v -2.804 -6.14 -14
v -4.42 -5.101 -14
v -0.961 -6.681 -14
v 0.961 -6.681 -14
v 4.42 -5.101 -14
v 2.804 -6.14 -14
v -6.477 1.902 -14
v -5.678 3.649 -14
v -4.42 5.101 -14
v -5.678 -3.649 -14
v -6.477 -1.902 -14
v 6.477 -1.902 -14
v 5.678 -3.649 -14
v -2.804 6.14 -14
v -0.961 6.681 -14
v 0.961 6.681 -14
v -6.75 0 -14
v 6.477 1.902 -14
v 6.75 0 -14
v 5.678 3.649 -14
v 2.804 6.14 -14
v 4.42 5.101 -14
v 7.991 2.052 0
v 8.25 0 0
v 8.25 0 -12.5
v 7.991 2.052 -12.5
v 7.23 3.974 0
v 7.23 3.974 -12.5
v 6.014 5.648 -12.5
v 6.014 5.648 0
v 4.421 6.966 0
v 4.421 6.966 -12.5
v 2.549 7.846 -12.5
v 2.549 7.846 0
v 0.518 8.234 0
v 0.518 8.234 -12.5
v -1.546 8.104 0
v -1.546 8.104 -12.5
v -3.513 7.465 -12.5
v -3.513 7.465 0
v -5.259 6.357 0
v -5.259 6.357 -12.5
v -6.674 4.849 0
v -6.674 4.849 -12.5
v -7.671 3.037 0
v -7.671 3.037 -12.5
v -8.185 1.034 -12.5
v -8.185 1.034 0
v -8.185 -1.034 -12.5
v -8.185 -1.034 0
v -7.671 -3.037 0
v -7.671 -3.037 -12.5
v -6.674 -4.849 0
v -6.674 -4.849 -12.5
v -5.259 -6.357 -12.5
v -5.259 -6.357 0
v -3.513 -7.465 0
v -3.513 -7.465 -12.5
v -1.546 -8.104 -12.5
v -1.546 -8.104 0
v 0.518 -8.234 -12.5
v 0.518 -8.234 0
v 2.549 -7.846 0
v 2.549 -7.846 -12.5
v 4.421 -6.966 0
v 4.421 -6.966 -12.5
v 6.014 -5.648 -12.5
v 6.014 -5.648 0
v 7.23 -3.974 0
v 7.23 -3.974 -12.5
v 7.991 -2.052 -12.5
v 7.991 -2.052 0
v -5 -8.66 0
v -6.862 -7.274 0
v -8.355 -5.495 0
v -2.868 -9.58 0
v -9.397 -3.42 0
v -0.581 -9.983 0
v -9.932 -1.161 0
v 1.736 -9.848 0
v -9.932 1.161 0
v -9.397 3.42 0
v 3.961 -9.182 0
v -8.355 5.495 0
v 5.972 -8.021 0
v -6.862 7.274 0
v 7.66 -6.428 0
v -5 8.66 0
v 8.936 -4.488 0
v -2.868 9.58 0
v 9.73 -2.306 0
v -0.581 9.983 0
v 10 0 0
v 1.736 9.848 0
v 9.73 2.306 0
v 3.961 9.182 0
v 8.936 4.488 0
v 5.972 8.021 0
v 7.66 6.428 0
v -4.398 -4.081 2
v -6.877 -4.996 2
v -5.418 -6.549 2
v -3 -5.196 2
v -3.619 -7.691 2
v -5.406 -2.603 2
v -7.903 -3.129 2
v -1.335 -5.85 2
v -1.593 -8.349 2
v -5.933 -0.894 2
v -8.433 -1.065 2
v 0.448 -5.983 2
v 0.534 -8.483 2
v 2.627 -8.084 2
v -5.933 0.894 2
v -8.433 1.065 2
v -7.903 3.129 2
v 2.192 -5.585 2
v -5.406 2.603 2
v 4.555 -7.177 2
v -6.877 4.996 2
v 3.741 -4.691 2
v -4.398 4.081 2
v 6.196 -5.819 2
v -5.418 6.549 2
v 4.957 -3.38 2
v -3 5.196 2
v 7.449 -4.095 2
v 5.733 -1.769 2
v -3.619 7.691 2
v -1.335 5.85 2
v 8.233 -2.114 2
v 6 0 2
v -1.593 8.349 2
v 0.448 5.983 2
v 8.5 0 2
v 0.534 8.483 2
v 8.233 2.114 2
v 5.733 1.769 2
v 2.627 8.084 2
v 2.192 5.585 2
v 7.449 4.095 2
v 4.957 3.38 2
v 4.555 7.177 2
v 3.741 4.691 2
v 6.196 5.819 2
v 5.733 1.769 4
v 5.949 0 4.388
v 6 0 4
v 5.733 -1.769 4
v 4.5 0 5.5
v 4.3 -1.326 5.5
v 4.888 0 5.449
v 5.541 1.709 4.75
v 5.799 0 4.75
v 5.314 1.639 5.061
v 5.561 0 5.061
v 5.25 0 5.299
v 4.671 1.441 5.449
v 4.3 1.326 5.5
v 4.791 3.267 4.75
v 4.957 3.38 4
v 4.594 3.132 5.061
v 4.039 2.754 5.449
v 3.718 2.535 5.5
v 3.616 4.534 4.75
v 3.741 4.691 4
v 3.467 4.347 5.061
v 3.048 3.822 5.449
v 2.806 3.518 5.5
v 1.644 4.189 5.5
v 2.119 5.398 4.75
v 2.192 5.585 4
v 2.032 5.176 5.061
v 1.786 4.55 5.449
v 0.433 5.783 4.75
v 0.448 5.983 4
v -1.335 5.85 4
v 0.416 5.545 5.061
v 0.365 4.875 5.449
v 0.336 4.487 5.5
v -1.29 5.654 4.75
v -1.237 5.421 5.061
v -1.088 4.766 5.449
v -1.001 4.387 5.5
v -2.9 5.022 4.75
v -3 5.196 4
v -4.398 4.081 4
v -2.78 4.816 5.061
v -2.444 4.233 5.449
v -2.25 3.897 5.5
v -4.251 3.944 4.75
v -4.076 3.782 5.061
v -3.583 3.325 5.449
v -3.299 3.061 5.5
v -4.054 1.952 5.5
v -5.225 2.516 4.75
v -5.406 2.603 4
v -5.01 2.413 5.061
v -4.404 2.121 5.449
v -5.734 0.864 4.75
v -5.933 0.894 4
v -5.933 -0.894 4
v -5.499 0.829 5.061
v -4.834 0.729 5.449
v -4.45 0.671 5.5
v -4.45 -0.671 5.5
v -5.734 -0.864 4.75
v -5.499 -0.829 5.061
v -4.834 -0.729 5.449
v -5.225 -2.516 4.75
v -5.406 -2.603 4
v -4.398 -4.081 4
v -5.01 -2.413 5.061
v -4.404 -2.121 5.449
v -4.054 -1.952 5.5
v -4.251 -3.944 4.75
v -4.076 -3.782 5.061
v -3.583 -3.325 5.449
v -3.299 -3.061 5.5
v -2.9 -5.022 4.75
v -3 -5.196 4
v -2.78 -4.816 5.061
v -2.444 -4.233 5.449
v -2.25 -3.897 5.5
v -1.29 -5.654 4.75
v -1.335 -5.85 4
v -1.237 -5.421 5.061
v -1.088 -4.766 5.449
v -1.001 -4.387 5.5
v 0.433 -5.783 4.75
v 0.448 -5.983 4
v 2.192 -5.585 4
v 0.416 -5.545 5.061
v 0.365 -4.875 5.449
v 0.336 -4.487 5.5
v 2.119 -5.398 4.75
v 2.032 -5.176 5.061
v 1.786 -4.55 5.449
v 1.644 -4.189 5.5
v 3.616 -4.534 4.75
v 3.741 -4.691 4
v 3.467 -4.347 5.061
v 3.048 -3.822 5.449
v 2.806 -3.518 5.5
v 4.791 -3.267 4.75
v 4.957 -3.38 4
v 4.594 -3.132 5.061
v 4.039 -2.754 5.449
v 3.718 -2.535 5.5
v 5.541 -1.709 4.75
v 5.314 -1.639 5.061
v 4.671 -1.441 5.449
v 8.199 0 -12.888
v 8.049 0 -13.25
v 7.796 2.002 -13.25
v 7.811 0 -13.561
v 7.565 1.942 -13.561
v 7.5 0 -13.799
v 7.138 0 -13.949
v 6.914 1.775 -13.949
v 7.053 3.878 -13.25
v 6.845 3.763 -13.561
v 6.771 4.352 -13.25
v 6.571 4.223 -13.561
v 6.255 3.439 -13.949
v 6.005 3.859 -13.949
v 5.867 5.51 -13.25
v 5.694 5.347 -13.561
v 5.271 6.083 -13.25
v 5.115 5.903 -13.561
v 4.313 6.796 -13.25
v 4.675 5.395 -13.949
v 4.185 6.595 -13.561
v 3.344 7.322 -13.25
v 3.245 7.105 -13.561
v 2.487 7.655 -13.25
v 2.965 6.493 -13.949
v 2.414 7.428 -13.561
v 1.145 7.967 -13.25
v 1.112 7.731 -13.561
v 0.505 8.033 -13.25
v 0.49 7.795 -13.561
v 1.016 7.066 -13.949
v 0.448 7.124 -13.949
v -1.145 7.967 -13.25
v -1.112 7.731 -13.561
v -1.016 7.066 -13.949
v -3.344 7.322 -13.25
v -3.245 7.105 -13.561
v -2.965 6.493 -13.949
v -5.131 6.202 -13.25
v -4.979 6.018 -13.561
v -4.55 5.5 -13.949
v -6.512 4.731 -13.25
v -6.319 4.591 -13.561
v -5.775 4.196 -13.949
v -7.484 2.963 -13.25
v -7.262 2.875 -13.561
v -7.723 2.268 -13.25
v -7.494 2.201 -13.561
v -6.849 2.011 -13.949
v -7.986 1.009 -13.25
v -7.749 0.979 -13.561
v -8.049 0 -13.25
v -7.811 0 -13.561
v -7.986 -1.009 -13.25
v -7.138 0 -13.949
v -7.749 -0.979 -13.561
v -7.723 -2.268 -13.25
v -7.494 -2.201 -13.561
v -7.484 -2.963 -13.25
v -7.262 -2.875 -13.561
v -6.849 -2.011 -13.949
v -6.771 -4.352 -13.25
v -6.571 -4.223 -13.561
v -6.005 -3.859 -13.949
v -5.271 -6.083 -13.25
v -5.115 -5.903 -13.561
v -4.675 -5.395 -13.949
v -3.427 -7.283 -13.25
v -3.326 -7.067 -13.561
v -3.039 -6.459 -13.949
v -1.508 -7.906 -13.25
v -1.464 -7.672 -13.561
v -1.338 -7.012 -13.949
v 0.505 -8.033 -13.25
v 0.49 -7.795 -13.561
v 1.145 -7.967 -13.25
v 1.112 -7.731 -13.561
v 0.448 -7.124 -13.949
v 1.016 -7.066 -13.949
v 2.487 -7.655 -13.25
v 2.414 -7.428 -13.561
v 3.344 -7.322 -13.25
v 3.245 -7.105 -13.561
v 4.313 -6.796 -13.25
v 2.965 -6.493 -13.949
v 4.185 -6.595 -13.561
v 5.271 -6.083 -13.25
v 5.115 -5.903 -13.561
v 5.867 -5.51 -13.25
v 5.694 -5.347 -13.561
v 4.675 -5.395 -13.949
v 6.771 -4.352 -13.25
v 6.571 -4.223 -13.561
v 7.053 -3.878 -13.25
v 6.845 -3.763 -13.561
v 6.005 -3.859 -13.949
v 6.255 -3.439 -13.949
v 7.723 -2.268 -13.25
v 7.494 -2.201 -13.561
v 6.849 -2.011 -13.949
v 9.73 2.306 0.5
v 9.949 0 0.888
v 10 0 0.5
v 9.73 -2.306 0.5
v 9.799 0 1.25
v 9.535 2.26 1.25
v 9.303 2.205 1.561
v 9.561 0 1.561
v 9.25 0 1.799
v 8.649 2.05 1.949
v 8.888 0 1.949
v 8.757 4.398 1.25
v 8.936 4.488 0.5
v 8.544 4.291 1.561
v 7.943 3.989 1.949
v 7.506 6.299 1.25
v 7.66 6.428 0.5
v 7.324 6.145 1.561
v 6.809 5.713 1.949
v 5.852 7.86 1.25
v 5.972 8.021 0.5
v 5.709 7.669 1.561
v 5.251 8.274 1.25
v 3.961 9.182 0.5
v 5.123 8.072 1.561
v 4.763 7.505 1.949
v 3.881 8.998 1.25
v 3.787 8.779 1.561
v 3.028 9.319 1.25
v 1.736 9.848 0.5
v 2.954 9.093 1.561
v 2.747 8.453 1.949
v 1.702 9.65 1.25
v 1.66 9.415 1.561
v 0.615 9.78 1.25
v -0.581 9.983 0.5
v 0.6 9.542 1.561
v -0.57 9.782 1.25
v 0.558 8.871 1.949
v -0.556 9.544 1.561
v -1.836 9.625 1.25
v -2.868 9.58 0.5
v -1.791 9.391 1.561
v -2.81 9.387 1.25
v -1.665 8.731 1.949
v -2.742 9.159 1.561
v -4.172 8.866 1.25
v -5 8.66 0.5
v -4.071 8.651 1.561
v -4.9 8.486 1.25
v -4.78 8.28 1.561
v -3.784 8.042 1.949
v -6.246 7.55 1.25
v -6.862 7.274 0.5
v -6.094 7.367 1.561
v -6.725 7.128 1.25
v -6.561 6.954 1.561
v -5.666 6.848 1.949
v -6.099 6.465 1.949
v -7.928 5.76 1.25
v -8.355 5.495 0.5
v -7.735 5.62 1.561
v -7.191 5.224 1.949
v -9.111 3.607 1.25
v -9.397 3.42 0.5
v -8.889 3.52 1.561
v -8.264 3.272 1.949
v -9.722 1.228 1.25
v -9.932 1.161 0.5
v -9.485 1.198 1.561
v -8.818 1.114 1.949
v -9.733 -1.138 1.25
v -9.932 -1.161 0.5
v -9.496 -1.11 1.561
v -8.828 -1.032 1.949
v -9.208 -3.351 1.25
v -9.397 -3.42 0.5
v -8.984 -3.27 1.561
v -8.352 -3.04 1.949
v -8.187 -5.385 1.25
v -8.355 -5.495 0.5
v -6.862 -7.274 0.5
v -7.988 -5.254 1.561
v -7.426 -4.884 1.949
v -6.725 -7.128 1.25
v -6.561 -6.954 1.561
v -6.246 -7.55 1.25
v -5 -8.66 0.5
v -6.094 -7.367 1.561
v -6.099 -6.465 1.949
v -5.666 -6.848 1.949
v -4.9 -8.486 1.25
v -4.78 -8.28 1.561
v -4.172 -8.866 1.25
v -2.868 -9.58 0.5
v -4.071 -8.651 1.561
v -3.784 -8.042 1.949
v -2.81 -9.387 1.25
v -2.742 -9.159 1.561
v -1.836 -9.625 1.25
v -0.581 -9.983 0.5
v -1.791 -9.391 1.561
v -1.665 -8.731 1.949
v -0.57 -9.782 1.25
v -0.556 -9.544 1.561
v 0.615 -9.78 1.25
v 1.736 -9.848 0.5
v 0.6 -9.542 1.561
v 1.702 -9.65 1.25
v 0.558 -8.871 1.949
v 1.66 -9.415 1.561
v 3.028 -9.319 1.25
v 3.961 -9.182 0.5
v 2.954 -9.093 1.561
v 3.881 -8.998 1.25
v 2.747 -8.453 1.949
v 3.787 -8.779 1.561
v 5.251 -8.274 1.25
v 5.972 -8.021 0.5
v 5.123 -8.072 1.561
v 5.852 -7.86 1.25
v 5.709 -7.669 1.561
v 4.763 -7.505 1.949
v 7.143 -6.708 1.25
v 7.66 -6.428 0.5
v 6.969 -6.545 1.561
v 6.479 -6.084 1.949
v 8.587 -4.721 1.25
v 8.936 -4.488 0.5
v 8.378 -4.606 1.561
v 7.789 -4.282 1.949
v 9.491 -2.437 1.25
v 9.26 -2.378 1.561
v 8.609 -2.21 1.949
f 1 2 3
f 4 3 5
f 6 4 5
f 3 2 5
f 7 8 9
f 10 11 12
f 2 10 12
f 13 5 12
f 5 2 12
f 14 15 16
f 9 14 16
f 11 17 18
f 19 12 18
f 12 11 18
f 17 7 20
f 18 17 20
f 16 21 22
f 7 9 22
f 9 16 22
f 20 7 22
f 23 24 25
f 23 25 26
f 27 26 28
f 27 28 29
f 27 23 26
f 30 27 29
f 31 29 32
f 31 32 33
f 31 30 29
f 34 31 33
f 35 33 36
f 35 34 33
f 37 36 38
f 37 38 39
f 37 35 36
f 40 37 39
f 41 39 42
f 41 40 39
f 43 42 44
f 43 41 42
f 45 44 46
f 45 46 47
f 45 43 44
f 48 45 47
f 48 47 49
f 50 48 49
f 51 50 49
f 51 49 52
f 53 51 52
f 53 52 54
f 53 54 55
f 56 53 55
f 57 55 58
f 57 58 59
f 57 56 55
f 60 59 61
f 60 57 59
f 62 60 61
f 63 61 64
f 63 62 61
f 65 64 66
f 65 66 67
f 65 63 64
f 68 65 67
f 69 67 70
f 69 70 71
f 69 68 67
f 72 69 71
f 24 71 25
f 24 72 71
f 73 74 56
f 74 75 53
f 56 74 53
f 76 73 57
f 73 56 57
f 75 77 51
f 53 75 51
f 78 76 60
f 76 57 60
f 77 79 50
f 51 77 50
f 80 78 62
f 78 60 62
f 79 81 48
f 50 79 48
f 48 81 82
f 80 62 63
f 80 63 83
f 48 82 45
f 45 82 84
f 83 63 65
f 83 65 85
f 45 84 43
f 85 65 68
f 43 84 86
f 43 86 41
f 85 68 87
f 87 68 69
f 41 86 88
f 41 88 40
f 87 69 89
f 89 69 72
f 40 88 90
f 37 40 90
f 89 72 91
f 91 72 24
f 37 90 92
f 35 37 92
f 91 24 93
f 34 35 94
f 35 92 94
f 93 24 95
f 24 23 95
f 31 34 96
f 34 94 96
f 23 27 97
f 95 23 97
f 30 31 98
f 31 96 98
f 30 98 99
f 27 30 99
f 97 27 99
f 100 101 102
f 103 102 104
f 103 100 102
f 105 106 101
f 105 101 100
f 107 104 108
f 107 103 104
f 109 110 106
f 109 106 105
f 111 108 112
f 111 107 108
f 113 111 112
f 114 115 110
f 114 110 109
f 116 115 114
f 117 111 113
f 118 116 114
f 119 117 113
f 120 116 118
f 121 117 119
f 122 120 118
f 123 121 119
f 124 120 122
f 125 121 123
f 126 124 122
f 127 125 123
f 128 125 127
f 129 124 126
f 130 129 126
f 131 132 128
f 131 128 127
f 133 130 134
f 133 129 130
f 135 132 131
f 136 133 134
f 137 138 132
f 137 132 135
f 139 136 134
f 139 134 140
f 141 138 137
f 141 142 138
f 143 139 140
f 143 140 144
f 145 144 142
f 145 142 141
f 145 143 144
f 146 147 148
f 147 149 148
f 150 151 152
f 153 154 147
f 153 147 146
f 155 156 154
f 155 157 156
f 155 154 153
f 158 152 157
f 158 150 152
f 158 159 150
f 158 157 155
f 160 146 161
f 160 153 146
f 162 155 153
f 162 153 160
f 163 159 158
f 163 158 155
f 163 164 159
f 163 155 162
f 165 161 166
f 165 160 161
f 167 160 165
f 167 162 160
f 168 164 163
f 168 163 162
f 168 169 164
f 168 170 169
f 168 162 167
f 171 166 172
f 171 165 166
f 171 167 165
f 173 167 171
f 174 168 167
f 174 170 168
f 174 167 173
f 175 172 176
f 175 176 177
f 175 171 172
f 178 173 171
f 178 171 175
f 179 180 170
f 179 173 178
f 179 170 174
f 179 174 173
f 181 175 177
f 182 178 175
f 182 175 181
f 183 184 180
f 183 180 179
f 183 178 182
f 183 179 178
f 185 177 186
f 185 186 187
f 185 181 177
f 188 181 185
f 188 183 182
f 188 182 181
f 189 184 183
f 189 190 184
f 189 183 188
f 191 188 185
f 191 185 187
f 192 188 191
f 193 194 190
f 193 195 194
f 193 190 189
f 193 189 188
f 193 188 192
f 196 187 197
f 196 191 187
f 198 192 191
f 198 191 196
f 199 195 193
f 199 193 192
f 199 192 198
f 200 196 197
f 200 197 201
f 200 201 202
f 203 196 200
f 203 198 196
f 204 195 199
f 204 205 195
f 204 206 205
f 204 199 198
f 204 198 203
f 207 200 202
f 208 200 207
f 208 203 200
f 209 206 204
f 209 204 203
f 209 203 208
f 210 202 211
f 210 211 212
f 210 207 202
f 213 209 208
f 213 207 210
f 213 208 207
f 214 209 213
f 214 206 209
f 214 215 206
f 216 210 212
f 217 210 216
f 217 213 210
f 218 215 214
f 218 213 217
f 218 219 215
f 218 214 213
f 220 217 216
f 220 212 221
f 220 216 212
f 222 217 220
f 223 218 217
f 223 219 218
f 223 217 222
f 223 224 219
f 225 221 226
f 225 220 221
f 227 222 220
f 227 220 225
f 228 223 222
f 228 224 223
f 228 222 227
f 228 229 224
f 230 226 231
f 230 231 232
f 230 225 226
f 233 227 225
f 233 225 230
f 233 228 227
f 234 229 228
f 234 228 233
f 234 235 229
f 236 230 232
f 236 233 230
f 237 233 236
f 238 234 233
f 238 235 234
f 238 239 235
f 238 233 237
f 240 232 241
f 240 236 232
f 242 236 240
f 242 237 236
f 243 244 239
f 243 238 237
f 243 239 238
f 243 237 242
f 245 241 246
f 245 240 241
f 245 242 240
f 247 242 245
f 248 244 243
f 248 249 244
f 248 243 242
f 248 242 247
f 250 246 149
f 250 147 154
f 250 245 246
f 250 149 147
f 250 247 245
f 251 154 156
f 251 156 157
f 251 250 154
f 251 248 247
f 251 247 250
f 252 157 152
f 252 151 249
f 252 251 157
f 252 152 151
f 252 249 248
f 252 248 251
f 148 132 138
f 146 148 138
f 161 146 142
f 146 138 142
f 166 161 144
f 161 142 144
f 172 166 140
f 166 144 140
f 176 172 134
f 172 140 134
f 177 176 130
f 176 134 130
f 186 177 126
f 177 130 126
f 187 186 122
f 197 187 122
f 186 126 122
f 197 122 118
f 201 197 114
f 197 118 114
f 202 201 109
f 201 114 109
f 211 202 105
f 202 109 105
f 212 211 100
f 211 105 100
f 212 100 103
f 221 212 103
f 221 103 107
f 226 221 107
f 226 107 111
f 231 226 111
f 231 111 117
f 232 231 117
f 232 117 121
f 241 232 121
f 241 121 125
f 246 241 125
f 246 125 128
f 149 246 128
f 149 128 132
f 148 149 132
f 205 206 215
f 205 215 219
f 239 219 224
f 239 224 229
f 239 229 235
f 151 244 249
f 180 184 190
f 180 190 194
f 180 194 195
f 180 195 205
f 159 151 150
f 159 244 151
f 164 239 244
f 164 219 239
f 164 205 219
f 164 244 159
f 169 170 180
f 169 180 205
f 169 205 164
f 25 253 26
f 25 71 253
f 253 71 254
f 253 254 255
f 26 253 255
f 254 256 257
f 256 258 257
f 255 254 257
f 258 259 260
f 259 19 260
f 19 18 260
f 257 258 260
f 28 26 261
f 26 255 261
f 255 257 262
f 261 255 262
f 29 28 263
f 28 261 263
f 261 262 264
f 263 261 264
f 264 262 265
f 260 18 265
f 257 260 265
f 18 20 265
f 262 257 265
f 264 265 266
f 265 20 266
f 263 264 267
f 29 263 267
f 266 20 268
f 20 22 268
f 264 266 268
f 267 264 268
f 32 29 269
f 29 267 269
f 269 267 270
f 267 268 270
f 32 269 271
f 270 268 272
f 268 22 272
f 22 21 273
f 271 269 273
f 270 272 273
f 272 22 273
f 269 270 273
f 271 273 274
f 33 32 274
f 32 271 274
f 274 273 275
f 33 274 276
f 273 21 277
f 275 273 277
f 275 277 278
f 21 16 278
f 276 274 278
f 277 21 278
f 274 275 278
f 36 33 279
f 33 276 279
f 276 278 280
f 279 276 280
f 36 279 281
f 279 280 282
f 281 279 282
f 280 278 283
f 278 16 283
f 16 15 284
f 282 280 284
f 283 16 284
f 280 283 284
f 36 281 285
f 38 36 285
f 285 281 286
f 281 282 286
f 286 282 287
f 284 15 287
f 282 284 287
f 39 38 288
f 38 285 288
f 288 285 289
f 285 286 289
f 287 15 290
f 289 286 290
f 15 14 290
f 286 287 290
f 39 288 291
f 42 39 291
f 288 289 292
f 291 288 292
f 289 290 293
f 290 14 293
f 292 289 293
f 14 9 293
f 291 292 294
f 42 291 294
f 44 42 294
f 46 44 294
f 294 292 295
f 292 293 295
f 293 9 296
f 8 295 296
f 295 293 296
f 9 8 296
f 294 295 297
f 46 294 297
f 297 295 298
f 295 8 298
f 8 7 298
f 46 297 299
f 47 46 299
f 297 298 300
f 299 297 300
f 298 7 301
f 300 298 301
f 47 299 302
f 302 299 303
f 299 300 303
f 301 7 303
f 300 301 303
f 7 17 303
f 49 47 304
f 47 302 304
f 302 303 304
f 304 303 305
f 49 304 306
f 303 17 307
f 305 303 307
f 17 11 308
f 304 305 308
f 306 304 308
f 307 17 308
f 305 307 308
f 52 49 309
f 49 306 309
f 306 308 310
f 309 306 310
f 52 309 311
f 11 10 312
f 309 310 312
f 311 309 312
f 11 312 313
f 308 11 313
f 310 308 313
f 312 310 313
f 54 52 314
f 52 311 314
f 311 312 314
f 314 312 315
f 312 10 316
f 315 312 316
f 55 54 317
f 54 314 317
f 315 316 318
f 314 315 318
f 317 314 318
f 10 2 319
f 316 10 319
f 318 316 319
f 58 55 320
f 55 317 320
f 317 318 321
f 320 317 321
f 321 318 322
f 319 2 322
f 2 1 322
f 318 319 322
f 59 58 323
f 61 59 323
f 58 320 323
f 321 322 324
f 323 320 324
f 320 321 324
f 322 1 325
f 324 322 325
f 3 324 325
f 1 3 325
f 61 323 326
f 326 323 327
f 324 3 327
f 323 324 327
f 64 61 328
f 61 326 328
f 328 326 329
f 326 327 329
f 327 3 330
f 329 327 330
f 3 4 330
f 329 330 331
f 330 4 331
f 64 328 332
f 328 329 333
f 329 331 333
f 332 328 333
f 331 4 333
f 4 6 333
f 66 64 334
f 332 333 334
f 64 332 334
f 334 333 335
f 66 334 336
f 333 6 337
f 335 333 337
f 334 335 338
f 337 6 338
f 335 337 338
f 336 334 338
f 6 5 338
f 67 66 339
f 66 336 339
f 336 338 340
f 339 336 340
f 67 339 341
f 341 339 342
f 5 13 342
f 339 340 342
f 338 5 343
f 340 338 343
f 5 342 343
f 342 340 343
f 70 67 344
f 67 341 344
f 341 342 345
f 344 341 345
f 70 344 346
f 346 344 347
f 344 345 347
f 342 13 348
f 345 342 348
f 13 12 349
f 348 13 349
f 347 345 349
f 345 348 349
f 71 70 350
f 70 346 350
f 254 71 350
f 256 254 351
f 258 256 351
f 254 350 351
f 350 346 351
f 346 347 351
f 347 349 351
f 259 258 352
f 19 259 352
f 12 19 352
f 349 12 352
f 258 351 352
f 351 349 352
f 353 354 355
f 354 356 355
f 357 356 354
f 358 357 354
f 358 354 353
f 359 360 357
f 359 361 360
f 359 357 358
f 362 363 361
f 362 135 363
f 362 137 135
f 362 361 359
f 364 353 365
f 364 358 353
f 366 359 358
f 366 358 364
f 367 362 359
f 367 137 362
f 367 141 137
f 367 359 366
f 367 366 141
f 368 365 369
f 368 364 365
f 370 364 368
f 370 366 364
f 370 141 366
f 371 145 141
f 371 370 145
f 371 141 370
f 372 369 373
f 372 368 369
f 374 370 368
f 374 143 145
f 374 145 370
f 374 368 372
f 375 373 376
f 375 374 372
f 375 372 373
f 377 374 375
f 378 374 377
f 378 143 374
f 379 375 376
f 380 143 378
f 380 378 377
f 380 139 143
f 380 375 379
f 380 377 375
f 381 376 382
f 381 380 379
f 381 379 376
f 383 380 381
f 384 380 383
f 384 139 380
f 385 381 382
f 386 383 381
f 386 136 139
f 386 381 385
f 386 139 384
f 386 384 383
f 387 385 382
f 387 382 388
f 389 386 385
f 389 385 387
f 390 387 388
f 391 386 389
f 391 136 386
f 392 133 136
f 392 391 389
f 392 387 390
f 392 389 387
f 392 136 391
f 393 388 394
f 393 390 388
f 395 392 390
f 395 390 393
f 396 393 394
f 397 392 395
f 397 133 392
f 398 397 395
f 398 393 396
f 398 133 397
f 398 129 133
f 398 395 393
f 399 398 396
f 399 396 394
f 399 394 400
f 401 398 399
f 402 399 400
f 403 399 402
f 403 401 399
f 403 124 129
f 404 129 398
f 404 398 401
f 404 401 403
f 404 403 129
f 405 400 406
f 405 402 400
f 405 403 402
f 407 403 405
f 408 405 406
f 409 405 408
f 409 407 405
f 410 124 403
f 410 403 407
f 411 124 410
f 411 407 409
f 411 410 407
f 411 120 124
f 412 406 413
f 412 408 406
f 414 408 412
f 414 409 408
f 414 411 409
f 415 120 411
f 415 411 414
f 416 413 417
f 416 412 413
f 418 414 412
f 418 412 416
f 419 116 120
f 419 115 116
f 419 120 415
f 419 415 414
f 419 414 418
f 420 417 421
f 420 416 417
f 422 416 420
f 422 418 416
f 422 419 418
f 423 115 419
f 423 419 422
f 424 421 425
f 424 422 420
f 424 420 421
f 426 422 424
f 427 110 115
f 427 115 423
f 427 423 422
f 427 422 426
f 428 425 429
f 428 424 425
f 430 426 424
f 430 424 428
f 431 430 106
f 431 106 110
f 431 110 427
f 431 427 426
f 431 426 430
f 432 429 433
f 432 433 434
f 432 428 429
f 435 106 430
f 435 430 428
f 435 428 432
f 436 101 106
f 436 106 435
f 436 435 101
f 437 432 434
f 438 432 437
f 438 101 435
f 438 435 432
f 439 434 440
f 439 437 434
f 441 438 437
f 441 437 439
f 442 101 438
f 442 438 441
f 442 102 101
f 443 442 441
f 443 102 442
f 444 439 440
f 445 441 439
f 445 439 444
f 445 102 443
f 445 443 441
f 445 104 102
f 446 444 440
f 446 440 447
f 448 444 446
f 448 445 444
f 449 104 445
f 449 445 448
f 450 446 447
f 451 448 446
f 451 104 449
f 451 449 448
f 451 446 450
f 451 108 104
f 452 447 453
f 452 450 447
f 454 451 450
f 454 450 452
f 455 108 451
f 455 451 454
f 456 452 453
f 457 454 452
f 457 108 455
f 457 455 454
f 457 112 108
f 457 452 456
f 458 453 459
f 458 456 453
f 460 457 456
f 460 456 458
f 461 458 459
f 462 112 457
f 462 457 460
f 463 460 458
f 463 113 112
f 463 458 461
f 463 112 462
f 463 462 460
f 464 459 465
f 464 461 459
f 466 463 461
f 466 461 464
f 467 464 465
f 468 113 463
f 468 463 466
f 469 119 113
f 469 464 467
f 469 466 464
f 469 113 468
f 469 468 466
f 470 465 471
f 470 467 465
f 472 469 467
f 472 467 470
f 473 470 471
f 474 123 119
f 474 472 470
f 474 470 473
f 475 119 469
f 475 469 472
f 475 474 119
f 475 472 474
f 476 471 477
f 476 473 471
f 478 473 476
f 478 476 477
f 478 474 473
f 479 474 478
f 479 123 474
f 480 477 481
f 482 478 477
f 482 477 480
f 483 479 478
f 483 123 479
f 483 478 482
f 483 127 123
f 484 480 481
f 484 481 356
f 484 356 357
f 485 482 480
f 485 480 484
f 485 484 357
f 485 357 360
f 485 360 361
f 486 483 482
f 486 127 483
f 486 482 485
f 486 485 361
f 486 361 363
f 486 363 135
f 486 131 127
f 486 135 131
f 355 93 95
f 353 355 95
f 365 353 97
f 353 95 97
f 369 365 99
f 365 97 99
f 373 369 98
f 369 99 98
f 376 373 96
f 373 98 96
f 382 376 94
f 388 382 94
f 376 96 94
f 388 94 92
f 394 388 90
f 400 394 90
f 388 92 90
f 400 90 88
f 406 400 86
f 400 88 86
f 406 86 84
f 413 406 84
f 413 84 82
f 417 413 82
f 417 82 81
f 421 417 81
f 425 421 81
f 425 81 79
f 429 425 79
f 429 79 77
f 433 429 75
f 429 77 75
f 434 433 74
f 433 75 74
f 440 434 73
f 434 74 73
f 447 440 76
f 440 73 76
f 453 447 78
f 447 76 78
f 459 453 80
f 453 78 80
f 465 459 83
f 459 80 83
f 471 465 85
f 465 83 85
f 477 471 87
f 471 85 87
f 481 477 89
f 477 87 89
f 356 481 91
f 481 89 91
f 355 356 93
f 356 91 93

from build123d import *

# Parameters (mm, degrees)
F0_R     = 6
F1_DEPTH = 5.5
F0_R_2   = 10
F0_R_3   = 8.25
F2_DEPTH = 2
F3_DEPTH = 14
F4_R     = 1.5


with BuildPart() as f1:
    # F0 (on Top) → F1 (new body)
    with BuildSketch(Plane.XY):
        Circle(F0_R)
    extrude(amount=F1_DEPTH)

    # F0 (on Top) → F2 (join)
    with BuildSketch(Plane.XY):
        Circle(F0_R_2)
        Circle(F0_R_3, mode=Mode.SUBTRACT)
        Circle(F0_R_3)
        Circle(F0_R, mode=Mode.SUBTRACT)
    extrude(amount=F2_DEPTH)

    # F0 (on Top) → F3 (join)
    with BuildSketch(Plane.XY):
        Circle(F0_R_3)
        Circle(F0_R, mode=Mode.SUBTRACT)
        Circle(F0_R)
    extrude(amount=-F3_DEPTH)

    # F4
    f4_edges = [f1.edges().sort_by_distance(p)[0] for p in [
        (-10, 0, 2),
        (-6, 0, 5.5),
        (-8.25, 0, -14),
    ]]
    fillet(f4_edges, radius=F4_R)


solid = f1.part
